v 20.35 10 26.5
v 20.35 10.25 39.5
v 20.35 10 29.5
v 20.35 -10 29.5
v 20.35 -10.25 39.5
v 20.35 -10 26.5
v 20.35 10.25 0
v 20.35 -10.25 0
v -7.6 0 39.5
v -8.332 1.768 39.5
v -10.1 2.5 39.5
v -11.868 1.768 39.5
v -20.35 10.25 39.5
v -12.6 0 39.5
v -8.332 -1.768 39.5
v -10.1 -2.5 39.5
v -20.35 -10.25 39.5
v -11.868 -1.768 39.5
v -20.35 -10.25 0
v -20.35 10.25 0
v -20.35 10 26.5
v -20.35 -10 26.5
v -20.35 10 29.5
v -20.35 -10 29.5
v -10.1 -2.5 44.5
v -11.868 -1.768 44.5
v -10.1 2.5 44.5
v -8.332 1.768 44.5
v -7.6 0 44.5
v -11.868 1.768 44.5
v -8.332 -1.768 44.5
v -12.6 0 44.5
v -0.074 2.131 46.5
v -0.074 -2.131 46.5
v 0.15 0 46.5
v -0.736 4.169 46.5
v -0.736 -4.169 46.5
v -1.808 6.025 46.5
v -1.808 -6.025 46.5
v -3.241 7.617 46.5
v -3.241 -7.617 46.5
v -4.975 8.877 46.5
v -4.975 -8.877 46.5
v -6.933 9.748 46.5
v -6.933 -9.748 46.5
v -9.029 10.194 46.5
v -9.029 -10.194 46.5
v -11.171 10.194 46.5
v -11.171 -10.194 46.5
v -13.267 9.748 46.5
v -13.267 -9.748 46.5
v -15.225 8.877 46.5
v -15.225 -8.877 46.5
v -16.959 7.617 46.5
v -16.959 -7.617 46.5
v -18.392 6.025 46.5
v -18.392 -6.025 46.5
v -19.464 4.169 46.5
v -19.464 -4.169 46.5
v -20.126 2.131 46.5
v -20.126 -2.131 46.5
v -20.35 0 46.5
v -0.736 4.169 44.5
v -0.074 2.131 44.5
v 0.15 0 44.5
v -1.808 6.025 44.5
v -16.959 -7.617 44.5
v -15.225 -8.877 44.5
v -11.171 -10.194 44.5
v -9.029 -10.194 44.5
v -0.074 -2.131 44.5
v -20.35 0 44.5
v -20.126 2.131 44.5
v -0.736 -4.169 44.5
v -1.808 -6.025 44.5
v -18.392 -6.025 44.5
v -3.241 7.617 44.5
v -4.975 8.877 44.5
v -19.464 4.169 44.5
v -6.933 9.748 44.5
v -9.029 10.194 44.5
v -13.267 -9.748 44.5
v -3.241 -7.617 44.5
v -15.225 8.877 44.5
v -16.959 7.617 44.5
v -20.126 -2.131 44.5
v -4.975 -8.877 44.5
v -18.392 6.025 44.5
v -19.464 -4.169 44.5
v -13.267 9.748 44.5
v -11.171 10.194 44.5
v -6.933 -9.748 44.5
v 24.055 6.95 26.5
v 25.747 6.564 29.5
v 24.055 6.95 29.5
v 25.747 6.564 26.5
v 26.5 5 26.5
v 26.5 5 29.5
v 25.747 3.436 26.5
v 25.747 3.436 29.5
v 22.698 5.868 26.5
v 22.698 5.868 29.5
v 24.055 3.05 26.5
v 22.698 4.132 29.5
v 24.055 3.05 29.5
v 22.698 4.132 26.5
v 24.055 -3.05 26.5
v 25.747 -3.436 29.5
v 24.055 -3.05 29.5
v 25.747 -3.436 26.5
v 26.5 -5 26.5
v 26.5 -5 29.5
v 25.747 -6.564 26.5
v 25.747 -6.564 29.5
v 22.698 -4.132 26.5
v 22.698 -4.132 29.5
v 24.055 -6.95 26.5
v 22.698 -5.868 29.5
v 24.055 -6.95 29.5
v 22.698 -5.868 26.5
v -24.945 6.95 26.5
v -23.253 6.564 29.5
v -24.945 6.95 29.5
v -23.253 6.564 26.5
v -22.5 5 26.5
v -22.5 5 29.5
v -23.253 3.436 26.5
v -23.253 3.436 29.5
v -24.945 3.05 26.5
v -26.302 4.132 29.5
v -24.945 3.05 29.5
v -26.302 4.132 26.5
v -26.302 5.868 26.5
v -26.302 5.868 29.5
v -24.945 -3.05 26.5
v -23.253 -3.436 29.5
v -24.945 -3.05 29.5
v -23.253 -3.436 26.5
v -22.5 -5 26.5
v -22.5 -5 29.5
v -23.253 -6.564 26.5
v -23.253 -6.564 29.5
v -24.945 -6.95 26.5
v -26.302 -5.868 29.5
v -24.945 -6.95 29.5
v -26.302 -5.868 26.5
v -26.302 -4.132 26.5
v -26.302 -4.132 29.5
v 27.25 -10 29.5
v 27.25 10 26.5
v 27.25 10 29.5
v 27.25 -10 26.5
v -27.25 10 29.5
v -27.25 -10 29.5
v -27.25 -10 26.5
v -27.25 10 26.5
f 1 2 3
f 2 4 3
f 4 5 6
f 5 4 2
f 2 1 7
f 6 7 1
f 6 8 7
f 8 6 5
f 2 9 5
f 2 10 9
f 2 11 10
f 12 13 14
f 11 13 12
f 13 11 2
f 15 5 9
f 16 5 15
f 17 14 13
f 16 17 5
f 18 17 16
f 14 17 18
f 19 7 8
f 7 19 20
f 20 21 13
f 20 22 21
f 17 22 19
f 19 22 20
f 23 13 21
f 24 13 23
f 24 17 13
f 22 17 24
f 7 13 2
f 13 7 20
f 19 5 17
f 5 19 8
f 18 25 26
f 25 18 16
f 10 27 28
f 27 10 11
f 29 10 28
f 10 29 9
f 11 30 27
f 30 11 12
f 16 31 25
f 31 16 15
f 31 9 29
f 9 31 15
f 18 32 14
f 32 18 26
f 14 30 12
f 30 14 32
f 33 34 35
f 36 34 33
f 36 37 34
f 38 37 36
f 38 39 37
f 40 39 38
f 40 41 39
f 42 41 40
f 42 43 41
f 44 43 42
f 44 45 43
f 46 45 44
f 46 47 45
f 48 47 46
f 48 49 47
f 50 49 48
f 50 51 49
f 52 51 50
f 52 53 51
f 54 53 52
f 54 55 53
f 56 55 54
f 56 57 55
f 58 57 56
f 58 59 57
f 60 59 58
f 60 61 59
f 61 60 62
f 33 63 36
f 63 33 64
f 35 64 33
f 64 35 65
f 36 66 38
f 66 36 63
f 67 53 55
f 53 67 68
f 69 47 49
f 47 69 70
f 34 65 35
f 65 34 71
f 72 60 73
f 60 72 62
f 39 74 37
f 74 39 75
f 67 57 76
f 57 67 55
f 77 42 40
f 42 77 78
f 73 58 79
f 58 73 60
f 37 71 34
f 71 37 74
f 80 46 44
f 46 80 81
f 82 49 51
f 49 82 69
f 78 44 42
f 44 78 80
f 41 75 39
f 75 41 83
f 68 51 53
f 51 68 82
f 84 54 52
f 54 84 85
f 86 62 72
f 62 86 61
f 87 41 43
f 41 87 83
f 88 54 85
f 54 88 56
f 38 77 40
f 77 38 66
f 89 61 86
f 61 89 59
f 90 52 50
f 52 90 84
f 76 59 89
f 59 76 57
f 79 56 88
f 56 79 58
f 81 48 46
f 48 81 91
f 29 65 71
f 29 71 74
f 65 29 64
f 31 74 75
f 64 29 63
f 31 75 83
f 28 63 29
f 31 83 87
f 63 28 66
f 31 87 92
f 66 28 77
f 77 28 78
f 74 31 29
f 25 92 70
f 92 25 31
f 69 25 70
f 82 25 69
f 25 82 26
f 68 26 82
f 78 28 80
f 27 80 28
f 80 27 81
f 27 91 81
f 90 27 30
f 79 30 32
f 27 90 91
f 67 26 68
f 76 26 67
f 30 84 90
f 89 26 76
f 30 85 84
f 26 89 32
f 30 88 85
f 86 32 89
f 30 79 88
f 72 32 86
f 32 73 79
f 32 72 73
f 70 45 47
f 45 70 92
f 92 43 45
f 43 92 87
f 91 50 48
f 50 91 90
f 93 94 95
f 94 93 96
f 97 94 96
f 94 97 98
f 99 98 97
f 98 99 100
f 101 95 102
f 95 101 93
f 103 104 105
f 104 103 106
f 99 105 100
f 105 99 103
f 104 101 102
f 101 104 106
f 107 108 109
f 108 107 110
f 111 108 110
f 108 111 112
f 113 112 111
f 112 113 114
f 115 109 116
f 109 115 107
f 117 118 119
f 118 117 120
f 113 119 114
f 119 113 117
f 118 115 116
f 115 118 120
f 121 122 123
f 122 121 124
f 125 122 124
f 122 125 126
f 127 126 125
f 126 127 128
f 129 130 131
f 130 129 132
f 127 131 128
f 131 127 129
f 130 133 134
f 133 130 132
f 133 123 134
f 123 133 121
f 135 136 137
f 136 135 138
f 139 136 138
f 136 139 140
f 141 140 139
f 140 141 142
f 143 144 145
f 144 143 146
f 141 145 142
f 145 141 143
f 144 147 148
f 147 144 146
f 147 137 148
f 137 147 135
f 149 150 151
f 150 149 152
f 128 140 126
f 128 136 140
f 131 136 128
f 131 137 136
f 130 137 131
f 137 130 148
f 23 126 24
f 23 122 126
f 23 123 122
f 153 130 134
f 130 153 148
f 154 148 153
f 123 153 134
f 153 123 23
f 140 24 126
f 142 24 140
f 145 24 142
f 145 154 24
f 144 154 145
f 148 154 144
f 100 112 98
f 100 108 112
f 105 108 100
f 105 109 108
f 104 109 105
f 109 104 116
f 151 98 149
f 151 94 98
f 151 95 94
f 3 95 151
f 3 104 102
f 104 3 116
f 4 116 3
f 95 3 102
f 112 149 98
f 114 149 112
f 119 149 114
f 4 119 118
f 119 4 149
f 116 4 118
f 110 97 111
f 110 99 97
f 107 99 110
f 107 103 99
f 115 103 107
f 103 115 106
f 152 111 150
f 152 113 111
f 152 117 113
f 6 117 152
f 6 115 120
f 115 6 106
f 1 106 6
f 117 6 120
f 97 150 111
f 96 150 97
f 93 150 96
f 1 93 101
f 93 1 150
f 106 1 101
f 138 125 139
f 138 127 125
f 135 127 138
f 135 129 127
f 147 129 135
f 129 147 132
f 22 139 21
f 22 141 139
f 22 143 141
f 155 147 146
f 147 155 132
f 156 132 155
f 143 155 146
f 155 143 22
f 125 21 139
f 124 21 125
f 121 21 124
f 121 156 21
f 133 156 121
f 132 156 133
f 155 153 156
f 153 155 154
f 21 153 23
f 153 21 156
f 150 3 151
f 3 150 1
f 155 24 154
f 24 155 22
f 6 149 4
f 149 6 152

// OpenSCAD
// file: tolerance.scad
// Author: Mihai Oltean, https://mihaioltean.github.io, mihai.oltean@gmail.com
// More details: jenny5.org
// Source: github.com/jenny5-robot
// MIT License
//--------------------------------------------------------------

tolerance = 0.1;
display_tolerance = 1;

overlap_tolerance = 0.01;

tolerance_z = [0, 0, tolerance];
tolerance_x = [tolerance, 0, 0];
tolerance_y = [0, tolerance, 0];

display_tolerance_z = [0, 0, display_tolerance];
display_tolerance_x = [display_tolerance, 0, 0];
display_tolerance_y = [0, display_tolerance, 0];

display_tolerance_xz = [display_tolerance, 0, display_tolerance];
display_tolerance_xy = [display_tolerance, display_tolerance, 0];
display_tolerance_yz = [0, display_tolerance, display_tolerance];

display_tolerance_xyz = [display_tolerance, display_tolerance, display_tolerance];
// file: servos_params.scad
// Author: Mihai Oltean, https://mihaioltean.github.io, mihai.oltean@gmail.com
// More details: https://jenny5.org, https://jenny5-robot.github.io/
// Source code: github.com/jenny5-robot
// MIT License
//--------------------------------------------------------------

HS_7985MG_size = [40, 20, 37];
HS_7985MG_screw_support_height = 26.5;
HS_7985MG_screw_support_size = [53, 20, 3];
HS_7985MG_screw_holes_position = [
[24, 5, 0],
[24, -5, 0],
[-24, 5, 0],
[-24, -5, 0]
];

1501MG_size = [40.7, 20.5, 39.5];
1501MG_screw_support_height = 26.5;
1501MG_screw_support_size = [54.5, 20, 3];
1501MG_screw_holes_position = [
    [24.5, 5, 0],
    [24.5, -5, 0],
    [-24.5, 5, 0],
    [-24.5, -5, 0]
];

1501MG_shaft_position = [1501MG_size[1] / 2, 1501MG_size[1] / 2, 1501MG_size[2]];
1501MG_shaft_length = 7;
1501MG_shaft_radius = 2.5;
// main file
// Author: Mihai Oltean, https://mihaioltean.github.io, mihai.oltean@gmail.com
// More details: https://jenny5.org, https://jenny5-robot.github.io/
// Source code: github.com/jenny5-robot
// MIT License
//--------------------------------------------------------------

include <servos_params.scad>

include <tolerance.scad>

//-----------------------------------------------------------
module HS_7985MG()
{
    translate ([-HS_7985MG_size[0] / 2, -HS_7985MG_size[1] / 2, 0]) cube(HS_7985MG_size);
    translate ([0, 0, HS_7985MG_screw_support_height]){
        difference(){
            translate([-HS_7985MG_screw_support_size[0] / 2, - HS_7985MG_screw_support_size[1] / 2, 0])
    cube(HS_7985MG_screw_support_size);
            for (i = [0: 3]){
                translate (HS_7985MG_screw_holes_position[i] - display_tolerance_z)
                cylinder(h = HS_7985MG_screw_support_size[2] + 2 * display_tolerance, r = 2);
            } 
        }
    }
}
//-----------------------------------------------------------
module power_hd_1501MG()
{
    // body
    translate ([-1501MG_size[0] / 2, -1501MG_size[1] / 2, 0]) {
        color("black") cube(1501MG_size);
        //shaft
        color("Yellow") translate (1501MG_shaft_position) cylinder(h = 1501MG_shaft_length, r = 1501MG_shaft_radius);
        // round plate
        translate (1501MG_shaft_position + [0, 0, 1501MG_shaft_length - 2]) cylinder(h = 2, r = 1501MG_size[1] / 2);
        
    }
    // ears
    translate ([0, 0, 1501MG_screw_support_height]){
        difference(){
            color("black") translate([-1501MG_screw_support_size[0] / 2, - 1501MG_screw_support_size[1] / 2, 0])
    cube(1501MG_screw_support_size);
            // screw holes
            for (i = [0 : 3]){
                translate (1501MG_screw_holes_position[i] - display_tolerance_z)
                cylinder(h = 1501MG_screw_support_size[2] + 2 * display_tolerance, r = 2);
            } 
        }
    }
    
    
    
}
//-----------------------------------------------------------

//HS_7985MG();
power_hd_1501MG();
